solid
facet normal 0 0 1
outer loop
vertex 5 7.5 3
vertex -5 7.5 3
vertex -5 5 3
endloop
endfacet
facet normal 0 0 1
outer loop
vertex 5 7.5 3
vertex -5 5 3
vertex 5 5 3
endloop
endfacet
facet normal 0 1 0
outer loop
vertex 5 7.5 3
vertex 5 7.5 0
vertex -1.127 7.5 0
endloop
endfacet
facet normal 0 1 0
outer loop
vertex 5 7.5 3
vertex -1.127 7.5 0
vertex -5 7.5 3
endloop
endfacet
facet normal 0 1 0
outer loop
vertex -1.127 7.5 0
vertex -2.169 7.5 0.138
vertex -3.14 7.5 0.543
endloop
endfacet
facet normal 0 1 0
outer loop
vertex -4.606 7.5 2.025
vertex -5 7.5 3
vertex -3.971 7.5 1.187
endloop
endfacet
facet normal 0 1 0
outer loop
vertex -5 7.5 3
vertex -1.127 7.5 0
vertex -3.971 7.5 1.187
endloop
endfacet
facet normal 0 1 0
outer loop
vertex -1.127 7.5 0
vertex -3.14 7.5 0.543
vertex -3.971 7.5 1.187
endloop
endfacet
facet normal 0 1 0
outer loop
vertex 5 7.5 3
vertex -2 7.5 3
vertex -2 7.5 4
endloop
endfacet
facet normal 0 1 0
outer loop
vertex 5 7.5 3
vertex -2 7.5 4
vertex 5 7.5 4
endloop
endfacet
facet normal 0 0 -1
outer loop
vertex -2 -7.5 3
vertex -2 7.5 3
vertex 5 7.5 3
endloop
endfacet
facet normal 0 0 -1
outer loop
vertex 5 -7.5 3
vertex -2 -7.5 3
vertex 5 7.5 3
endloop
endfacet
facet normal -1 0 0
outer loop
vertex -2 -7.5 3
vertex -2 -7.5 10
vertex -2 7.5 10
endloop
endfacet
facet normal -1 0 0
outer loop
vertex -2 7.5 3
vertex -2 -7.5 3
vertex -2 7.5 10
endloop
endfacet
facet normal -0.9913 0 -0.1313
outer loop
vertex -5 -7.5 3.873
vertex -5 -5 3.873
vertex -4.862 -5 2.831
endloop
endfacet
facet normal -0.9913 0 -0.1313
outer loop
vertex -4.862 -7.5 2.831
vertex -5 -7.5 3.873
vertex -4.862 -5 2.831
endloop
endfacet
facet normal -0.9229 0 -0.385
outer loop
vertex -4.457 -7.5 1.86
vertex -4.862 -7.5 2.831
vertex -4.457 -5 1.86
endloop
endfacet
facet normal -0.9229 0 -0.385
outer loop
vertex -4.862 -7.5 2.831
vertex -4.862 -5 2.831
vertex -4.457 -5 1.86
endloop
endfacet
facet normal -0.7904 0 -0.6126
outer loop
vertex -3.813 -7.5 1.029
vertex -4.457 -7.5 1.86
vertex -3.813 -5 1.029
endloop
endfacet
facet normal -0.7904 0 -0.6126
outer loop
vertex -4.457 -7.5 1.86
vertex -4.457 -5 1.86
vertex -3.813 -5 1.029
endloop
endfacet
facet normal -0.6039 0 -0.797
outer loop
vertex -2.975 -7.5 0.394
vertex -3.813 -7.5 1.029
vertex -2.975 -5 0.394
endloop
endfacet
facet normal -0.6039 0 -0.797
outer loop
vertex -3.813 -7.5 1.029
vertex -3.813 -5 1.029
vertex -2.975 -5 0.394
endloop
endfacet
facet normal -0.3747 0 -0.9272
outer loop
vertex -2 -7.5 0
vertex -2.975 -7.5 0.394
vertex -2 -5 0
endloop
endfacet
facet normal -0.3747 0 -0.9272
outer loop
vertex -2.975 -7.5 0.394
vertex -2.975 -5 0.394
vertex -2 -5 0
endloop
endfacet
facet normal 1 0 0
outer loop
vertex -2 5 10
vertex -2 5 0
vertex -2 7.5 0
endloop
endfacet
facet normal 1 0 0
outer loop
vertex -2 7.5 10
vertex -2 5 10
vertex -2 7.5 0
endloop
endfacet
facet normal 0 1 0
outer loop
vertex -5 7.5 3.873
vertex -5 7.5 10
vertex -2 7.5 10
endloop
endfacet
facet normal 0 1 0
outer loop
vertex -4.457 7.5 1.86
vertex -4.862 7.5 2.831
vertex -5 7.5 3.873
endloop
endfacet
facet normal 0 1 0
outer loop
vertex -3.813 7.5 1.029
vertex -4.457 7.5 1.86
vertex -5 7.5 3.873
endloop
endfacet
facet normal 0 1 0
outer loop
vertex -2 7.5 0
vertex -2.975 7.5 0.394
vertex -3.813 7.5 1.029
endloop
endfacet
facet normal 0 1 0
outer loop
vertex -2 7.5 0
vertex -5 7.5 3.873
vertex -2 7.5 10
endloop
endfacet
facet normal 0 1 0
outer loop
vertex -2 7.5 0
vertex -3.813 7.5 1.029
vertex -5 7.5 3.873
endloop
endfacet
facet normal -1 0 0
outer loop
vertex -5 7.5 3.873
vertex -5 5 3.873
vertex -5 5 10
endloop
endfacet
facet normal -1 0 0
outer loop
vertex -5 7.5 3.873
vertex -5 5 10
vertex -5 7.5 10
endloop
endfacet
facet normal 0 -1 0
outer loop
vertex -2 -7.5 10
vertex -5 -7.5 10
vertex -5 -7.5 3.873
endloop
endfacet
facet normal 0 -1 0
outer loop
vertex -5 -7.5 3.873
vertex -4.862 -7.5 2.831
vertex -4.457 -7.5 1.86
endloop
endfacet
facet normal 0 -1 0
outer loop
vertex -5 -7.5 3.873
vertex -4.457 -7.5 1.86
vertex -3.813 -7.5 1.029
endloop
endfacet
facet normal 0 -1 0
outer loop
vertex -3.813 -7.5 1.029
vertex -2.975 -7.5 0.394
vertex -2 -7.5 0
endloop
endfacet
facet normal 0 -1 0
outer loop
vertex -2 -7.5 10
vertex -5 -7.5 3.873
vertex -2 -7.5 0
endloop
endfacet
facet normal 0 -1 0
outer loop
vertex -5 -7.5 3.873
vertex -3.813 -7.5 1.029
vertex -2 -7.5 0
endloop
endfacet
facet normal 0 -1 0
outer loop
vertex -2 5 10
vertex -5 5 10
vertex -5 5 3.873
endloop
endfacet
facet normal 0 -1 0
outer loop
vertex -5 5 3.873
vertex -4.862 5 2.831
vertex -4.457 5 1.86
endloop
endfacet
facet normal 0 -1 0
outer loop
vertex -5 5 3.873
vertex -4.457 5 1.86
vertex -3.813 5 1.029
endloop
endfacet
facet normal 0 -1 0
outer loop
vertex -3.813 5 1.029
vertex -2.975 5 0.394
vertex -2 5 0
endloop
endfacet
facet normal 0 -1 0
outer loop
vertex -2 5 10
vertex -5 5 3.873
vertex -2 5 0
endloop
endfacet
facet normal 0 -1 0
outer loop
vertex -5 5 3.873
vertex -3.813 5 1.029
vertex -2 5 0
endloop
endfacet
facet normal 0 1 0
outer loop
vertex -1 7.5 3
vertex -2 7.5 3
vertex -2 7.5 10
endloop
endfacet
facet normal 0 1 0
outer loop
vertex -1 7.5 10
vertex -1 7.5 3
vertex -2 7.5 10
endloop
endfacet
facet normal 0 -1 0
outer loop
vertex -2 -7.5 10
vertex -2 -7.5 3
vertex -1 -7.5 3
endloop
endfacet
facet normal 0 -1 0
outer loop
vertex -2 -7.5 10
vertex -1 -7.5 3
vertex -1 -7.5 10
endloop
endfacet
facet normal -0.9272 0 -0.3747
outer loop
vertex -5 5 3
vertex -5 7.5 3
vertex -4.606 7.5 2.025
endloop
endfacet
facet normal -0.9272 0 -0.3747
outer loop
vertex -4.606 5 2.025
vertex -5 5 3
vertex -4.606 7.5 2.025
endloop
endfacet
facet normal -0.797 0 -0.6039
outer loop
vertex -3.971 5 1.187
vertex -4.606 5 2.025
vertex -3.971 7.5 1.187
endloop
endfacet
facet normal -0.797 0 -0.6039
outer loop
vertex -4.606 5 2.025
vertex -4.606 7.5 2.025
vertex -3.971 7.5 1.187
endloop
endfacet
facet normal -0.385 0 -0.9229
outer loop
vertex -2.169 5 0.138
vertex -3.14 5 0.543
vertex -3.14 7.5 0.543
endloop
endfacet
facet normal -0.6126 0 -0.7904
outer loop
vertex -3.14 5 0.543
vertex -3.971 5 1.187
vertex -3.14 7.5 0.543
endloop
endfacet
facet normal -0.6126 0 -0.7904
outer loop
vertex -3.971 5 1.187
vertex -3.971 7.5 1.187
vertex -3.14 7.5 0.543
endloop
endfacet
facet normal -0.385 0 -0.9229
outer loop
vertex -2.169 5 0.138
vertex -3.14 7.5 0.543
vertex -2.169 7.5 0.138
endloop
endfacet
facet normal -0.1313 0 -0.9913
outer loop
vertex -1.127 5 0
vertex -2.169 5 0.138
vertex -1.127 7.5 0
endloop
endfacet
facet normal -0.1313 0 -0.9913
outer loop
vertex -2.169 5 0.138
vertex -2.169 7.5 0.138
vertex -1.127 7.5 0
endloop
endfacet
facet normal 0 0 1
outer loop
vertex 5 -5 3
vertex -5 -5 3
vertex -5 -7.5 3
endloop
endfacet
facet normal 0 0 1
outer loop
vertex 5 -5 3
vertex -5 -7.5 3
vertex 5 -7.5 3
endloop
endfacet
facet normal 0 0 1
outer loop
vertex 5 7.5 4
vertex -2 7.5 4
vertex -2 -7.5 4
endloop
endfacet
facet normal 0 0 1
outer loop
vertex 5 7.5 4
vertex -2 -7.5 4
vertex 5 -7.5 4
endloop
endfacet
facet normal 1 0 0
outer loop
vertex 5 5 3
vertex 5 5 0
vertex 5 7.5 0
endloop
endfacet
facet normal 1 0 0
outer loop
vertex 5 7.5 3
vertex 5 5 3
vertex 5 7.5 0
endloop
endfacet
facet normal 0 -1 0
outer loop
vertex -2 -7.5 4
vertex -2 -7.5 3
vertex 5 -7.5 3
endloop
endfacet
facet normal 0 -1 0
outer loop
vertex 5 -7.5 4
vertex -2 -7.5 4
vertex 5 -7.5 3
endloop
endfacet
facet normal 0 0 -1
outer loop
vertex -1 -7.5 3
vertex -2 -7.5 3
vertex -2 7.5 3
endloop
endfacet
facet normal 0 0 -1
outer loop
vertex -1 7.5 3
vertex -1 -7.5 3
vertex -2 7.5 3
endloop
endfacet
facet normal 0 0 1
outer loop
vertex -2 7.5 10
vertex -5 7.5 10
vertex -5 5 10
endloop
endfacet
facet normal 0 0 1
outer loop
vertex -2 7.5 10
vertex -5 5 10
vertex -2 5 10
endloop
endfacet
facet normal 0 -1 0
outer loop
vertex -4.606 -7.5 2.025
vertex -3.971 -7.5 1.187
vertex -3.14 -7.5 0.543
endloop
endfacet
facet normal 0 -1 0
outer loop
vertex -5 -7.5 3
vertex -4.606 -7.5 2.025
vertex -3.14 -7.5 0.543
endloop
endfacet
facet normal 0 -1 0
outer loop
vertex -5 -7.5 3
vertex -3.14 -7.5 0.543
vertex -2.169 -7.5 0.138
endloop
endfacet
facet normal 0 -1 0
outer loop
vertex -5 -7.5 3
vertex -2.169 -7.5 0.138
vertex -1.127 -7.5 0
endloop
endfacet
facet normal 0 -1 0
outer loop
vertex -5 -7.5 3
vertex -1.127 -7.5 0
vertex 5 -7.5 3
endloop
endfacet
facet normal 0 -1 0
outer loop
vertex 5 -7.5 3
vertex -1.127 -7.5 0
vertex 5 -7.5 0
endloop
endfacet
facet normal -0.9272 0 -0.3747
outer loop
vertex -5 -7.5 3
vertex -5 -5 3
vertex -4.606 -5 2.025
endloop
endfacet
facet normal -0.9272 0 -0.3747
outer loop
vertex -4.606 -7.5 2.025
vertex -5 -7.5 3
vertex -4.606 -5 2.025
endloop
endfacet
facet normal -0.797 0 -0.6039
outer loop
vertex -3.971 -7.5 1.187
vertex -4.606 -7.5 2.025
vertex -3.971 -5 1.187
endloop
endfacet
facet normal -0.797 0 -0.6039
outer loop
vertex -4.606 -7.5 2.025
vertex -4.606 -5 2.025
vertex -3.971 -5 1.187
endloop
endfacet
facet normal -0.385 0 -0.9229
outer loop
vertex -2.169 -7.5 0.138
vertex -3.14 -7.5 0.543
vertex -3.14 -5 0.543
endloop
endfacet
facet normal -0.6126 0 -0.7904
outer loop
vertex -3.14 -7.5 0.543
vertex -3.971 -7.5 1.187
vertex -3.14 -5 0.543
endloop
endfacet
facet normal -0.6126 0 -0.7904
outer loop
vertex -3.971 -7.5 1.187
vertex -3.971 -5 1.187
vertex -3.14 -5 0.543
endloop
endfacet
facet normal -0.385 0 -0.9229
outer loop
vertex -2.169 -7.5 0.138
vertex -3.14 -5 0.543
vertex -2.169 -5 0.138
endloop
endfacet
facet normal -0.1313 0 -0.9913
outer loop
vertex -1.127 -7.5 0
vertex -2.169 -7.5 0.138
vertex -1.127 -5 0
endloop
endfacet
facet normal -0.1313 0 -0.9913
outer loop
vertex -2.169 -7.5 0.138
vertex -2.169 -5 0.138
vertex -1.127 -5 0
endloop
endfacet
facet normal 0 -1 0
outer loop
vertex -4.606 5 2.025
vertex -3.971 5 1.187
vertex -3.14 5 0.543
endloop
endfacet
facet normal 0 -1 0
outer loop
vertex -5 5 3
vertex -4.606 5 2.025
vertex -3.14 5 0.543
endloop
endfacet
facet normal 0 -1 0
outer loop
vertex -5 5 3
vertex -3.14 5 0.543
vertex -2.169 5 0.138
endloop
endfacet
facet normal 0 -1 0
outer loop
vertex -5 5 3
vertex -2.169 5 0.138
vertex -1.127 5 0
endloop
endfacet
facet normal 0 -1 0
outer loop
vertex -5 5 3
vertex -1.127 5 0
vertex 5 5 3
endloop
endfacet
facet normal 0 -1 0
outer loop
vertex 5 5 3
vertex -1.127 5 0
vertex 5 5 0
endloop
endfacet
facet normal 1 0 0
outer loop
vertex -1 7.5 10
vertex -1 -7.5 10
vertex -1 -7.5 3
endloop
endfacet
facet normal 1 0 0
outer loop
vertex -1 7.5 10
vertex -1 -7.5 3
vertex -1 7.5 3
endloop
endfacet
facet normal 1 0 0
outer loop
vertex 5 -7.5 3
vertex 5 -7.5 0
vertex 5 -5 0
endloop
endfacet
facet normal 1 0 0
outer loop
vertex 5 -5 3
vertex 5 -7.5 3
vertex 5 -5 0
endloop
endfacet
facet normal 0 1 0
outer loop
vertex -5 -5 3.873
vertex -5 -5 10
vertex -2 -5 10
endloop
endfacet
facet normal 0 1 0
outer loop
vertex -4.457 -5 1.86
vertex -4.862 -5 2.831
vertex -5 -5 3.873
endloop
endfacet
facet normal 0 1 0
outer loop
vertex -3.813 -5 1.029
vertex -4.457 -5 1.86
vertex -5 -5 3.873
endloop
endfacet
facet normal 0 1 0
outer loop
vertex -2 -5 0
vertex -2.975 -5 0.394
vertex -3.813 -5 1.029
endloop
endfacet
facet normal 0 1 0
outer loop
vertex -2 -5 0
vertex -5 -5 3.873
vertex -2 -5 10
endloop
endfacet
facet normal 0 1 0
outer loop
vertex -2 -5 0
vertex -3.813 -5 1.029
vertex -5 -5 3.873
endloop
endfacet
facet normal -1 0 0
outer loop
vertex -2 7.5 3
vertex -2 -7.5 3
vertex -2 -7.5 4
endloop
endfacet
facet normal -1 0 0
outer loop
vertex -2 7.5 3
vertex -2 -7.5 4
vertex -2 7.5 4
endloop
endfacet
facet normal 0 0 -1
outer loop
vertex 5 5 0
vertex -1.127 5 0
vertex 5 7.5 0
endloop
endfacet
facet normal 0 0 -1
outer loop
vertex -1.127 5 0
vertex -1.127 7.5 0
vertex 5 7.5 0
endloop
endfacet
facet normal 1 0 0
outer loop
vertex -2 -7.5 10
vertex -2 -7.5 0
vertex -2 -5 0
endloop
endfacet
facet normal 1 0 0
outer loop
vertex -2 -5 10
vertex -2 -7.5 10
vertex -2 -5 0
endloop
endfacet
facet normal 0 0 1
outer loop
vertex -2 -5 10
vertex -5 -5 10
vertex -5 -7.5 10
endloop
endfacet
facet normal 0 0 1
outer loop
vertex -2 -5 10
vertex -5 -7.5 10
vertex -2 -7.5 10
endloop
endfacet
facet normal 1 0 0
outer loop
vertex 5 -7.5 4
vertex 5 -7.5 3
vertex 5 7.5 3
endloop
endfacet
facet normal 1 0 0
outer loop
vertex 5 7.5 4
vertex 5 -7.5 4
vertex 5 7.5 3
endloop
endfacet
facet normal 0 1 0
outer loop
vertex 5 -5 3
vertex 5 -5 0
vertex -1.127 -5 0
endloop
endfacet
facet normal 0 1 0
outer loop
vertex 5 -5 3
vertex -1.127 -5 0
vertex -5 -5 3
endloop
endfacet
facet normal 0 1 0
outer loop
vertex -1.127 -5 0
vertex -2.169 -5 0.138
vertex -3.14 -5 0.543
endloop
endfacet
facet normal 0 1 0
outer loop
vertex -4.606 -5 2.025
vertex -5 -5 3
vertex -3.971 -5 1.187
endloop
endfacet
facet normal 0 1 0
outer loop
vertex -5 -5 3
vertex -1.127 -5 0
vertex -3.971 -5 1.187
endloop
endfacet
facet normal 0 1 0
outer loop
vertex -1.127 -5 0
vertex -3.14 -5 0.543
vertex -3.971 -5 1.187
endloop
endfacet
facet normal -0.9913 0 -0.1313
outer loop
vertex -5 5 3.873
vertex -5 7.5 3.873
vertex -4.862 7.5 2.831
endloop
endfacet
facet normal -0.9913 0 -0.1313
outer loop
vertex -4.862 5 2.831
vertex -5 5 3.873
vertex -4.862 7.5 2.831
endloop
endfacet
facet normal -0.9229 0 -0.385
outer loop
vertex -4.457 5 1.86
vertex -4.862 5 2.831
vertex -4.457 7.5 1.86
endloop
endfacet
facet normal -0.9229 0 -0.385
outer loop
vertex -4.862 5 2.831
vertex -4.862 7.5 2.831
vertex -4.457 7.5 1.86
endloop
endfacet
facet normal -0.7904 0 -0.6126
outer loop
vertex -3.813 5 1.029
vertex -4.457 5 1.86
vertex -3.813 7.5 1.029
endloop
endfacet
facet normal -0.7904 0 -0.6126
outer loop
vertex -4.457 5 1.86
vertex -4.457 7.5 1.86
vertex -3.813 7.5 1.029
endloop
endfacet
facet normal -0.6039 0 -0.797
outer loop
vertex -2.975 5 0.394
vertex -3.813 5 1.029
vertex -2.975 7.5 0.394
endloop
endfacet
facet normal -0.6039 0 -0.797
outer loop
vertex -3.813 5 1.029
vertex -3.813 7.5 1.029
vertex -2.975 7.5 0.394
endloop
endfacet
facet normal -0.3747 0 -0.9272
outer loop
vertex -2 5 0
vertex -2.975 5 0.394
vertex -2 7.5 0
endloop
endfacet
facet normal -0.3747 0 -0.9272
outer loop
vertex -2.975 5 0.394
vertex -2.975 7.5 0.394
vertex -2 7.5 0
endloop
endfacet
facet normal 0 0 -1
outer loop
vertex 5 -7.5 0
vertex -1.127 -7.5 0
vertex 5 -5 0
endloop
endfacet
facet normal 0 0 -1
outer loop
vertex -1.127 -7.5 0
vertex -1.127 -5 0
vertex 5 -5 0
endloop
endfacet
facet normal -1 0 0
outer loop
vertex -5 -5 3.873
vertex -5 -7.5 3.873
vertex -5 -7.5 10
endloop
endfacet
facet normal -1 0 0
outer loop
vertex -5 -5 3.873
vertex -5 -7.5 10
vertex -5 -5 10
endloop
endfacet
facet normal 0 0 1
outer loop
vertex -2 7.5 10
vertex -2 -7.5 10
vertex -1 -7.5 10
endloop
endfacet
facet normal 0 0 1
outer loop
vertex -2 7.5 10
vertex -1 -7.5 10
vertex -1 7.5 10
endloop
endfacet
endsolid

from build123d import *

# Parameters (mm, degrees)
F0_W          = 7
F0_H          = 2.5
F0_W_2        = 3
F1_DEPTH      = 3
F2_DEPTH      = 10
F3_W          = 7
F3_H          = 15
F4_DEPTH      = 1
F5_W          = 15
F5_H          = 7
F6_DEPTH      = 1
F7_T1_DEPTH   = 21.864916731
F8_T1_DEPTH   = 21.864916731
F8_2_T1_DEPTH = 21.864916731
F9_T1_DEPTH   = 21.864916731


# Not quite as in the source:
# - a fillet or chamfer that OpenCascade refuses, or shapes differently, is made with other operations: its cross-section is extruded or revolved along the edge and cut away or added


with BuildPart() as f1:
    # F0 (on Top) → F1 (new body)
    with BuildSketch(Plane.XY):
        with Locations((1.5, -6.25)):
            Rectangle(F0_W, F0_H)
        with Locations((-3.5, -6.25)):
            Rectangle(F0_W_2, F0_H)
    extrude(amount=F1_DEPTH)

    # F7: fillet of radius 4 on 1 edges, made by hand

    # F7_s2 → F7_t1 (cut)
    with BuildSketch(Plane.XZ.offset(-4.6824583655)):
        with BuildLine():
            ThreePointArc((-5, 3), (-3.5765063966, 0.8377223398), (-1.1270166538, 0))
            Line((-1.1270166538, 0), (-5, 0))
            Line((-5, 0), (-5, 3))
        make_face()
    extrude(amount=F7_T1_DEPTH, mode=Mode.SUBTRACT)


with BuildPart() as f1b:
    # F0 (on Top) → F1, piece 2 (new body)
    with BuildSketch(Plane.XY):
        with Locations((1.5, 6.25)):
            Rectangle(F0_W, F0_H)
        with Locations((-3.5, 6.25)):
            Rectangle(F0_W_2, F0_H)
    extrude(amount=F1_DEPTH)

    # F8: fillet of radius 4 on 1 edges, made by hand

    # F8_s2 → F8_t1 (cut)
    with BuildSketch(Plane.XZ.offset(-17.1824583655)):
        with BuildLine():
            ThreePointArc((-5, 3), (-3.5765063966, 0.8377223398), (-1.1270166538, 0))
            Line((-1.1270166538, 0), (-5, 0))
            Line((-5, 0), (-5, 3))
        make_face()
    extrude(amount=F8_T1_DEPTH, mode=Mode.SUBTRACT)


with BuildPart() as f2:
    # F0 (on Top) → F2 (new body)
    with BuildSketch(Plane.XY):
        with Locations((-3.5, -6.25)):
            Rectangle(F0_W_2, F0_H)
    extrude(amount=F2_DEPTH)

    # F8#2: fillet of radius 4 on 1 edges, made by hand

    # F8_2_s2 → F8_2_t1 (cut)
    with BuildSketch(Plane.XZ.offset(-4.6824583655)):
        with BuildLine():
            ThreePointArc((-5, 3.8729833462), (-4.1622776602, 1.4234936034), (-2, 0))
            Line((-2, 0), (-5, 0))
            Line((-5, 0), (-5, 3.8729833462))
        make_face()
    extrude(amount=F8_2_T1_DEPTH, mode=Mode.SUBTRACT)


with BuildPart() as f2b:
    # F0 (on Top) → F2, piece 2 (new body)
    with BuildSketch(Plane.XY):
        with Locations((-3.5, 6.25)):
            Rectangle(F0_W_2, F0_H)
    extrude(amount=F2_DEPTH)

    # F9: fillet of radius 4 on 1 edges, made by hand

    # F9_s2 → F9_t1 (cut)
    with BuildSketch(Plane.XZ.offset(-17.1824583655)):
        with BuildLine():
            ThreePointArc((-5, 3.8729833462), (-4.1622776602, 1.4234936034), (-2, 0))
            Line((-2, 0), (-5, 0))
            Line((-5, 0), (-5, 3.8729833462))
        make_face()
    extrude(amount=F9_T1_DEPTH, mode=Mode.SUBTRACT)


with BuildPart() as f4:
    # F3 (on face) → F4 (new body)
    with BuildSketch(Plane.XY.offset(3)):
        with Locations((1.5, 0)):
            Rectangle(F3_W, F3_H)
    extrude(amount=F4_DEPTH)


with BuildPart() as f6:
    # F5 (on face) → F6 (new body)
    with BuildSketch(Plane.YZ.offset(-2)):
        with Locations((0, 6.5)):
            Rectangle(F5_W, F5_H)
    extrude(amount=F6_DEPTH)


solid = Compound([f1.part, f1b.part, f2.part, f2b.part, f4.part, f6.part])
